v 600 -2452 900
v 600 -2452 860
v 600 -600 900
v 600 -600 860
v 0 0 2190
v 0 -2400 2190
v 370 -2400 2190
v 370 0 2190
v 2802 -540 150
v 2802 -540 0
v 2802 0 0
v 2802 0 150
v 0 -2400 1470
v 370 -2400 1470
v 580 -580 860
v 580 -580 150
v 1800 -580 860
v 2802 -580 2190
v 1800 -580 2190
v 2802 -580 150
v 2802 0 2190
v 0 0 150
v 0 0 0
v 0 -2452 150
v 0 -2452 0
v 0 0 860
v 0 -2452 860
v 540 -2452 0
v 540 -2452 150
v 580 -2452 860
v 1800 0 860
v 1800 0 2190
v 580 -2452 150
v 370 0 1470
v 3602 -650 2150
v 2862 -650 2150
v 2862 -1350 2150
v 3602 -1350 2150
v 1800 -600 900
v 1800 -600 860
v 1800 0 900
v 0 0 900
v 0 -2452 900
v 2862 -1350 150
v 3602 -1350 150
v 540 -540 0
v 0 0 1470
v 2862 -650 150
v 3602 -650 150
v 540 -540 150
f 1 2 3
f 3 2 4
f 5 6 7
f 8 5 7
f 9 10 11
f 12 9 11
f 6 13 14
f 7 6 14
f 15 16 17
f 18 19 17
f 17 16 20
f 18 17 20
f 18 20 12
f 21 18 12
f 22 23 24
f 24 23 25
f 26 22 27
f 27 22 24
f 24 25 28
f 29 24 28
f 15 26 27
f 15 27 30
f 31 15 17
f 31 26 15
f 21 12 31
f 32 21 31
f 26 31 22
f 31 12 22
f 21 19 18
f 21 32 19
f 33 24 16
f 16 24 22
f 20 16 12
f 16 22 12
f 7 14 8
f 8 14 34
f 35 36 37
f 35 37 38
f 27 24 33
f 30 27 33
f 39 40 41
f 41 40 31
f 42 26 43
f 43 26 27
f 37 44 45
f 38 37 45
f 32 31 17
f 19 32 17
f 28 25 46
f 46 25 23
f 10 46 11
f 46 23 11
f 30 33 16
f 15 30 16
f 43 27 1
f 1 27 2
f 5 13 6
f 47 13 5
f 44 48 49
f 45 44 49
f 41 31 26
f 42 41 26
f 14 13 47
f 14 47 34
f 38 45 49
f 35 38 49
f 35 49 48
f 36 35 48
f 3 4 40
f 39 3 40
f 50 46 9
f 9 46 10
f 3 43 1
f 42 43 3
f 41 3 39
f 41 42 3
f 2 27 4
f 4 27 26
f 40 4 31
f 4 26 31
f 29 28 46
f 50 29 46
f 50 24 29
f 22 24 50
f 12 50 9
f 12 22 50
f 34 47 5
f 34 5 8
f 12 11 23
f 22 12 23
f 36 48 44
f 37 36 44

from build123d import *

# Parameters (mm, degrees)
F1_START = 150
F0_W     = 1002
F0_H     = 40
F0_H_2   = 540
F1_DEPTH = 2040
F2_START = 150
F0_W_2   = 370
F0_H_3   = 2400
F2_DEPTH = 710
F3_START = 860
F3_DEPTH = 40
F4_DEPTH = 150
F5_START = 150
F5_DEPTH = 2000
F6_START = 1470
F6_DEPTH = 720


with BuildPart() as f1:
    # F0 (on Top) → F1 (new body)
    with BuildSketch(Plane.XY.offset(F1_START)):
        with Locations((2301, -560)):
            Rectangle(F0_W, F0_H)
        with Locations((2301, -270)):
            Rectangle(F0_W, F0_H_2)
    extrude(amount=F1_DEPTH)

    # F0 (on Top) → F2 (join)
    with BuildSketch(Plane.XY.offset(F2_START)):
        Polygon((1800, -580), (1800, -540), (540, -540), (540, -2452), (580, -2452), (580, -580), align=None)
        Polygon((1800, 0), (370, 0), (370, -2400), (0, -2400), (0, -2452), (540, -2452), (540, -540), (1800, -540), align=None)
        with Locations((185, -1200)):
            Rectangle(F0_W_2, F0_H_3)
    extrude(amount=F2_DEPTH)


with BuildPart() as f3:
    # F0 (on Top) → F3 (new body)
    with BuildSketch(Plane.XY.offset(F3_START)):
        Polygon((1800, -580), (1800, -540), (540, -540), (540, -2452), (580, -2452), (580, -580), align=None)
        Polygon((1800, -600), (1800, -580), (580, -580), (580, -2452), (600, -2452), (600, -600), align=None)
        Polygon((1800, 0), (370, 0), (370, -2400), (0, -2400), (0, -2452), (540, -2452), (540, -540), (1800, -540), align=None)
        with Locations((185, -1200)):
            Rectangle(F0_W_2, F0_H_3)
    extrude(amount=F3_DEPTH)


with BuildPart() as f4:
    # F0 (on Top) → F4 (new body, through all)
    with BuildSketch(Plane.XY):
        Polygon((1800, 0), (370, 0), (370, -2400), (0, -2400), (0, -2452), (540, -2452), (540, -540), (1800, -540), align=None)
        with Locations((2301, -270)):
            Rectangle(F0_W, F0_H_2)
        with Locations((185, -1200)):
            Rectangle(F0_W_2, F0_H_3)
    extrude(amount=F4_DEPTH)


with BuildPart() as f5:
    # F0 (on Top) → F5 (new body)
    with BuildSketch(Plane.XY.offset(F5_START)):
        Polygon((3602, -650), (3022, -650), (2862, -650), (2862, -1350), (3022, -1350), (3602, -1350), align=None)
    extrude(amount=F5_DEPTH)


with BuildPart() as f6:
    # F0 (on Top) → F6 (new body)
    with BuildSketch(Plane.XY.offset(F6_START)):
        with Locations((185, -1200)):
            Rectangle(F0_W_2, F0_H_3)
    extrude(amount=F6_DEPTH)


solid = Compound([f1.part, f3.part, f4.part, f5.part, f6.part])
